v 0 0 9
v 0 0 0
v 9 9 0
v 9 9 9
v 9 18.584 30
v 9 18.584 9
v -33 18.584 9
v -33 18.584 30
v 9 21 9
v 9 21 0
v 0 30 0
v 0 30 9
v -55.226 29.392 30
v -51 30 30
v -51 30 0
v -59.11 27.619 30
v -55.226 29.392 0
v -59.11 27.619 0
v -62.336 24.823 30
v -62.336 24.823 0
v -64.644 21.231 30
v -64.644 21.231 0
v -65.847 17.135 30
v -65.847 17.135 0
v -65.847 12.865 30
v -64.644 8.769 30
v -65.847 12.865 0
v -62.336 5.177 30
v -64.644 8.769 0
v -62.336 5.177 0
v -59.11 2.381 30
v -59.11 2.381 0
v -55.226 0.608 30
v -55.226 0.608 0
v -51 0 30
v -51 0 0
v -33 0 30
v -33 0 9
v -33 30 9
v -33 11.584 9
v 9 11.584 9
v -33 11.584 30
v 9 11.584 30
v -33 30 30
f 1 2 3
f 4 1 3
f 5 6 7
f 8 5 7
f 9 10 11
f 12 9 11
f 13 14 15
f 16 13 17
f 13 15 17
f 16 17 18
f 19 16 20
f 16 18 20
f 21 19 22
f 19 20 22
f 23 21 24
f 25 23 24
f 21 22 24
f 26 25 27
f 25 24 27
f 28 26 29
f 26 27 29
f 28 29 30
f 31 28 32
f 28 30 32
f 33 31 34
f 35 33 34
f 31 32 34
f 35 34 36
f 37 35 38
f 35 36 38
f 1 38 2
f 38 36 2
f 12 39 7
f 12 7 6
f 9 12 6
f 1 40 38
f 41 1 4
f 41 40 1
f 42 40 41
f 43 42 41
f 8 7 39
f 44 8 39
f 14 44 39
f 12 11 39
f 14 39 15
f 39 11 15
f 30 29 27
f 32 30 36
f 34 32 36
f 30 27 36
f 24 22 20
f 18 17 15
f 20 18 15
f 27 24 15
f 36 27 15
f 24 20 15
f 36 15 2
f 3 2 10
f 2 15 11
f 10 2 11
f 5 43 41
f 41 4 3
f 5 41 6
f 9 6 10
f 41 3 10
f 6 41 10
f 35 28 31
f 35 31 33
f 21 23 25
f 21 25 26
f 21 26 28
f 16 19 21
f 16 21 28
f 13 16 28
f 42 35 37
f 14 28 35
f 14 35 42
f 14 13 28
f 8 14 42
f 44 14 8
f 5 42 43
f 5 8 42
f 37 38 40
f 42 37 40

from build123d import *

# Parameters (mm, degrees)
F1_DEPTH = 9
F3_DEPTH = 21


with BuildPart() as f1:
    # F0 (on Top) → F1 (new body)
    with BuildSketch(Plane.XY):
        with BuildLine():
            Line((-51, 0), (0, 0))
            Line((0, 0), (9, 9))
            Line((9, 9), (9, 21))
            Line((9, 21), (0, 30))
            Line((0, 30), (-51, 30))
            ThreePointArc((-51, 30), (-66, 15), (-51, 0))
        make_face()
    extrude(amount=F1_DEPTH)

    # F2 (on face) → F3 (join)
    with BuildSketch(Plane.XY.offset(9)):
        with BuildLine():
            Line((-33, 18.583739), (-33, 30))
            Line((-33, 30), (-51, 30))
            ThreePointArc((-51, 30), (-66, 15), (-51, 0))
            Line((-51, 0), (-33, 0))
            Line((-33, 0), (-33, 11.583739))
            Line((-33, 11.583739), (9, 11.583739))
            Line((9, 11.583739), (9, 18.583739))
            Line((9, 18.583739), (-33, 18.583739))
        make_face()
    extrude(amount=F3_DEPTH)


solid = f1.part
